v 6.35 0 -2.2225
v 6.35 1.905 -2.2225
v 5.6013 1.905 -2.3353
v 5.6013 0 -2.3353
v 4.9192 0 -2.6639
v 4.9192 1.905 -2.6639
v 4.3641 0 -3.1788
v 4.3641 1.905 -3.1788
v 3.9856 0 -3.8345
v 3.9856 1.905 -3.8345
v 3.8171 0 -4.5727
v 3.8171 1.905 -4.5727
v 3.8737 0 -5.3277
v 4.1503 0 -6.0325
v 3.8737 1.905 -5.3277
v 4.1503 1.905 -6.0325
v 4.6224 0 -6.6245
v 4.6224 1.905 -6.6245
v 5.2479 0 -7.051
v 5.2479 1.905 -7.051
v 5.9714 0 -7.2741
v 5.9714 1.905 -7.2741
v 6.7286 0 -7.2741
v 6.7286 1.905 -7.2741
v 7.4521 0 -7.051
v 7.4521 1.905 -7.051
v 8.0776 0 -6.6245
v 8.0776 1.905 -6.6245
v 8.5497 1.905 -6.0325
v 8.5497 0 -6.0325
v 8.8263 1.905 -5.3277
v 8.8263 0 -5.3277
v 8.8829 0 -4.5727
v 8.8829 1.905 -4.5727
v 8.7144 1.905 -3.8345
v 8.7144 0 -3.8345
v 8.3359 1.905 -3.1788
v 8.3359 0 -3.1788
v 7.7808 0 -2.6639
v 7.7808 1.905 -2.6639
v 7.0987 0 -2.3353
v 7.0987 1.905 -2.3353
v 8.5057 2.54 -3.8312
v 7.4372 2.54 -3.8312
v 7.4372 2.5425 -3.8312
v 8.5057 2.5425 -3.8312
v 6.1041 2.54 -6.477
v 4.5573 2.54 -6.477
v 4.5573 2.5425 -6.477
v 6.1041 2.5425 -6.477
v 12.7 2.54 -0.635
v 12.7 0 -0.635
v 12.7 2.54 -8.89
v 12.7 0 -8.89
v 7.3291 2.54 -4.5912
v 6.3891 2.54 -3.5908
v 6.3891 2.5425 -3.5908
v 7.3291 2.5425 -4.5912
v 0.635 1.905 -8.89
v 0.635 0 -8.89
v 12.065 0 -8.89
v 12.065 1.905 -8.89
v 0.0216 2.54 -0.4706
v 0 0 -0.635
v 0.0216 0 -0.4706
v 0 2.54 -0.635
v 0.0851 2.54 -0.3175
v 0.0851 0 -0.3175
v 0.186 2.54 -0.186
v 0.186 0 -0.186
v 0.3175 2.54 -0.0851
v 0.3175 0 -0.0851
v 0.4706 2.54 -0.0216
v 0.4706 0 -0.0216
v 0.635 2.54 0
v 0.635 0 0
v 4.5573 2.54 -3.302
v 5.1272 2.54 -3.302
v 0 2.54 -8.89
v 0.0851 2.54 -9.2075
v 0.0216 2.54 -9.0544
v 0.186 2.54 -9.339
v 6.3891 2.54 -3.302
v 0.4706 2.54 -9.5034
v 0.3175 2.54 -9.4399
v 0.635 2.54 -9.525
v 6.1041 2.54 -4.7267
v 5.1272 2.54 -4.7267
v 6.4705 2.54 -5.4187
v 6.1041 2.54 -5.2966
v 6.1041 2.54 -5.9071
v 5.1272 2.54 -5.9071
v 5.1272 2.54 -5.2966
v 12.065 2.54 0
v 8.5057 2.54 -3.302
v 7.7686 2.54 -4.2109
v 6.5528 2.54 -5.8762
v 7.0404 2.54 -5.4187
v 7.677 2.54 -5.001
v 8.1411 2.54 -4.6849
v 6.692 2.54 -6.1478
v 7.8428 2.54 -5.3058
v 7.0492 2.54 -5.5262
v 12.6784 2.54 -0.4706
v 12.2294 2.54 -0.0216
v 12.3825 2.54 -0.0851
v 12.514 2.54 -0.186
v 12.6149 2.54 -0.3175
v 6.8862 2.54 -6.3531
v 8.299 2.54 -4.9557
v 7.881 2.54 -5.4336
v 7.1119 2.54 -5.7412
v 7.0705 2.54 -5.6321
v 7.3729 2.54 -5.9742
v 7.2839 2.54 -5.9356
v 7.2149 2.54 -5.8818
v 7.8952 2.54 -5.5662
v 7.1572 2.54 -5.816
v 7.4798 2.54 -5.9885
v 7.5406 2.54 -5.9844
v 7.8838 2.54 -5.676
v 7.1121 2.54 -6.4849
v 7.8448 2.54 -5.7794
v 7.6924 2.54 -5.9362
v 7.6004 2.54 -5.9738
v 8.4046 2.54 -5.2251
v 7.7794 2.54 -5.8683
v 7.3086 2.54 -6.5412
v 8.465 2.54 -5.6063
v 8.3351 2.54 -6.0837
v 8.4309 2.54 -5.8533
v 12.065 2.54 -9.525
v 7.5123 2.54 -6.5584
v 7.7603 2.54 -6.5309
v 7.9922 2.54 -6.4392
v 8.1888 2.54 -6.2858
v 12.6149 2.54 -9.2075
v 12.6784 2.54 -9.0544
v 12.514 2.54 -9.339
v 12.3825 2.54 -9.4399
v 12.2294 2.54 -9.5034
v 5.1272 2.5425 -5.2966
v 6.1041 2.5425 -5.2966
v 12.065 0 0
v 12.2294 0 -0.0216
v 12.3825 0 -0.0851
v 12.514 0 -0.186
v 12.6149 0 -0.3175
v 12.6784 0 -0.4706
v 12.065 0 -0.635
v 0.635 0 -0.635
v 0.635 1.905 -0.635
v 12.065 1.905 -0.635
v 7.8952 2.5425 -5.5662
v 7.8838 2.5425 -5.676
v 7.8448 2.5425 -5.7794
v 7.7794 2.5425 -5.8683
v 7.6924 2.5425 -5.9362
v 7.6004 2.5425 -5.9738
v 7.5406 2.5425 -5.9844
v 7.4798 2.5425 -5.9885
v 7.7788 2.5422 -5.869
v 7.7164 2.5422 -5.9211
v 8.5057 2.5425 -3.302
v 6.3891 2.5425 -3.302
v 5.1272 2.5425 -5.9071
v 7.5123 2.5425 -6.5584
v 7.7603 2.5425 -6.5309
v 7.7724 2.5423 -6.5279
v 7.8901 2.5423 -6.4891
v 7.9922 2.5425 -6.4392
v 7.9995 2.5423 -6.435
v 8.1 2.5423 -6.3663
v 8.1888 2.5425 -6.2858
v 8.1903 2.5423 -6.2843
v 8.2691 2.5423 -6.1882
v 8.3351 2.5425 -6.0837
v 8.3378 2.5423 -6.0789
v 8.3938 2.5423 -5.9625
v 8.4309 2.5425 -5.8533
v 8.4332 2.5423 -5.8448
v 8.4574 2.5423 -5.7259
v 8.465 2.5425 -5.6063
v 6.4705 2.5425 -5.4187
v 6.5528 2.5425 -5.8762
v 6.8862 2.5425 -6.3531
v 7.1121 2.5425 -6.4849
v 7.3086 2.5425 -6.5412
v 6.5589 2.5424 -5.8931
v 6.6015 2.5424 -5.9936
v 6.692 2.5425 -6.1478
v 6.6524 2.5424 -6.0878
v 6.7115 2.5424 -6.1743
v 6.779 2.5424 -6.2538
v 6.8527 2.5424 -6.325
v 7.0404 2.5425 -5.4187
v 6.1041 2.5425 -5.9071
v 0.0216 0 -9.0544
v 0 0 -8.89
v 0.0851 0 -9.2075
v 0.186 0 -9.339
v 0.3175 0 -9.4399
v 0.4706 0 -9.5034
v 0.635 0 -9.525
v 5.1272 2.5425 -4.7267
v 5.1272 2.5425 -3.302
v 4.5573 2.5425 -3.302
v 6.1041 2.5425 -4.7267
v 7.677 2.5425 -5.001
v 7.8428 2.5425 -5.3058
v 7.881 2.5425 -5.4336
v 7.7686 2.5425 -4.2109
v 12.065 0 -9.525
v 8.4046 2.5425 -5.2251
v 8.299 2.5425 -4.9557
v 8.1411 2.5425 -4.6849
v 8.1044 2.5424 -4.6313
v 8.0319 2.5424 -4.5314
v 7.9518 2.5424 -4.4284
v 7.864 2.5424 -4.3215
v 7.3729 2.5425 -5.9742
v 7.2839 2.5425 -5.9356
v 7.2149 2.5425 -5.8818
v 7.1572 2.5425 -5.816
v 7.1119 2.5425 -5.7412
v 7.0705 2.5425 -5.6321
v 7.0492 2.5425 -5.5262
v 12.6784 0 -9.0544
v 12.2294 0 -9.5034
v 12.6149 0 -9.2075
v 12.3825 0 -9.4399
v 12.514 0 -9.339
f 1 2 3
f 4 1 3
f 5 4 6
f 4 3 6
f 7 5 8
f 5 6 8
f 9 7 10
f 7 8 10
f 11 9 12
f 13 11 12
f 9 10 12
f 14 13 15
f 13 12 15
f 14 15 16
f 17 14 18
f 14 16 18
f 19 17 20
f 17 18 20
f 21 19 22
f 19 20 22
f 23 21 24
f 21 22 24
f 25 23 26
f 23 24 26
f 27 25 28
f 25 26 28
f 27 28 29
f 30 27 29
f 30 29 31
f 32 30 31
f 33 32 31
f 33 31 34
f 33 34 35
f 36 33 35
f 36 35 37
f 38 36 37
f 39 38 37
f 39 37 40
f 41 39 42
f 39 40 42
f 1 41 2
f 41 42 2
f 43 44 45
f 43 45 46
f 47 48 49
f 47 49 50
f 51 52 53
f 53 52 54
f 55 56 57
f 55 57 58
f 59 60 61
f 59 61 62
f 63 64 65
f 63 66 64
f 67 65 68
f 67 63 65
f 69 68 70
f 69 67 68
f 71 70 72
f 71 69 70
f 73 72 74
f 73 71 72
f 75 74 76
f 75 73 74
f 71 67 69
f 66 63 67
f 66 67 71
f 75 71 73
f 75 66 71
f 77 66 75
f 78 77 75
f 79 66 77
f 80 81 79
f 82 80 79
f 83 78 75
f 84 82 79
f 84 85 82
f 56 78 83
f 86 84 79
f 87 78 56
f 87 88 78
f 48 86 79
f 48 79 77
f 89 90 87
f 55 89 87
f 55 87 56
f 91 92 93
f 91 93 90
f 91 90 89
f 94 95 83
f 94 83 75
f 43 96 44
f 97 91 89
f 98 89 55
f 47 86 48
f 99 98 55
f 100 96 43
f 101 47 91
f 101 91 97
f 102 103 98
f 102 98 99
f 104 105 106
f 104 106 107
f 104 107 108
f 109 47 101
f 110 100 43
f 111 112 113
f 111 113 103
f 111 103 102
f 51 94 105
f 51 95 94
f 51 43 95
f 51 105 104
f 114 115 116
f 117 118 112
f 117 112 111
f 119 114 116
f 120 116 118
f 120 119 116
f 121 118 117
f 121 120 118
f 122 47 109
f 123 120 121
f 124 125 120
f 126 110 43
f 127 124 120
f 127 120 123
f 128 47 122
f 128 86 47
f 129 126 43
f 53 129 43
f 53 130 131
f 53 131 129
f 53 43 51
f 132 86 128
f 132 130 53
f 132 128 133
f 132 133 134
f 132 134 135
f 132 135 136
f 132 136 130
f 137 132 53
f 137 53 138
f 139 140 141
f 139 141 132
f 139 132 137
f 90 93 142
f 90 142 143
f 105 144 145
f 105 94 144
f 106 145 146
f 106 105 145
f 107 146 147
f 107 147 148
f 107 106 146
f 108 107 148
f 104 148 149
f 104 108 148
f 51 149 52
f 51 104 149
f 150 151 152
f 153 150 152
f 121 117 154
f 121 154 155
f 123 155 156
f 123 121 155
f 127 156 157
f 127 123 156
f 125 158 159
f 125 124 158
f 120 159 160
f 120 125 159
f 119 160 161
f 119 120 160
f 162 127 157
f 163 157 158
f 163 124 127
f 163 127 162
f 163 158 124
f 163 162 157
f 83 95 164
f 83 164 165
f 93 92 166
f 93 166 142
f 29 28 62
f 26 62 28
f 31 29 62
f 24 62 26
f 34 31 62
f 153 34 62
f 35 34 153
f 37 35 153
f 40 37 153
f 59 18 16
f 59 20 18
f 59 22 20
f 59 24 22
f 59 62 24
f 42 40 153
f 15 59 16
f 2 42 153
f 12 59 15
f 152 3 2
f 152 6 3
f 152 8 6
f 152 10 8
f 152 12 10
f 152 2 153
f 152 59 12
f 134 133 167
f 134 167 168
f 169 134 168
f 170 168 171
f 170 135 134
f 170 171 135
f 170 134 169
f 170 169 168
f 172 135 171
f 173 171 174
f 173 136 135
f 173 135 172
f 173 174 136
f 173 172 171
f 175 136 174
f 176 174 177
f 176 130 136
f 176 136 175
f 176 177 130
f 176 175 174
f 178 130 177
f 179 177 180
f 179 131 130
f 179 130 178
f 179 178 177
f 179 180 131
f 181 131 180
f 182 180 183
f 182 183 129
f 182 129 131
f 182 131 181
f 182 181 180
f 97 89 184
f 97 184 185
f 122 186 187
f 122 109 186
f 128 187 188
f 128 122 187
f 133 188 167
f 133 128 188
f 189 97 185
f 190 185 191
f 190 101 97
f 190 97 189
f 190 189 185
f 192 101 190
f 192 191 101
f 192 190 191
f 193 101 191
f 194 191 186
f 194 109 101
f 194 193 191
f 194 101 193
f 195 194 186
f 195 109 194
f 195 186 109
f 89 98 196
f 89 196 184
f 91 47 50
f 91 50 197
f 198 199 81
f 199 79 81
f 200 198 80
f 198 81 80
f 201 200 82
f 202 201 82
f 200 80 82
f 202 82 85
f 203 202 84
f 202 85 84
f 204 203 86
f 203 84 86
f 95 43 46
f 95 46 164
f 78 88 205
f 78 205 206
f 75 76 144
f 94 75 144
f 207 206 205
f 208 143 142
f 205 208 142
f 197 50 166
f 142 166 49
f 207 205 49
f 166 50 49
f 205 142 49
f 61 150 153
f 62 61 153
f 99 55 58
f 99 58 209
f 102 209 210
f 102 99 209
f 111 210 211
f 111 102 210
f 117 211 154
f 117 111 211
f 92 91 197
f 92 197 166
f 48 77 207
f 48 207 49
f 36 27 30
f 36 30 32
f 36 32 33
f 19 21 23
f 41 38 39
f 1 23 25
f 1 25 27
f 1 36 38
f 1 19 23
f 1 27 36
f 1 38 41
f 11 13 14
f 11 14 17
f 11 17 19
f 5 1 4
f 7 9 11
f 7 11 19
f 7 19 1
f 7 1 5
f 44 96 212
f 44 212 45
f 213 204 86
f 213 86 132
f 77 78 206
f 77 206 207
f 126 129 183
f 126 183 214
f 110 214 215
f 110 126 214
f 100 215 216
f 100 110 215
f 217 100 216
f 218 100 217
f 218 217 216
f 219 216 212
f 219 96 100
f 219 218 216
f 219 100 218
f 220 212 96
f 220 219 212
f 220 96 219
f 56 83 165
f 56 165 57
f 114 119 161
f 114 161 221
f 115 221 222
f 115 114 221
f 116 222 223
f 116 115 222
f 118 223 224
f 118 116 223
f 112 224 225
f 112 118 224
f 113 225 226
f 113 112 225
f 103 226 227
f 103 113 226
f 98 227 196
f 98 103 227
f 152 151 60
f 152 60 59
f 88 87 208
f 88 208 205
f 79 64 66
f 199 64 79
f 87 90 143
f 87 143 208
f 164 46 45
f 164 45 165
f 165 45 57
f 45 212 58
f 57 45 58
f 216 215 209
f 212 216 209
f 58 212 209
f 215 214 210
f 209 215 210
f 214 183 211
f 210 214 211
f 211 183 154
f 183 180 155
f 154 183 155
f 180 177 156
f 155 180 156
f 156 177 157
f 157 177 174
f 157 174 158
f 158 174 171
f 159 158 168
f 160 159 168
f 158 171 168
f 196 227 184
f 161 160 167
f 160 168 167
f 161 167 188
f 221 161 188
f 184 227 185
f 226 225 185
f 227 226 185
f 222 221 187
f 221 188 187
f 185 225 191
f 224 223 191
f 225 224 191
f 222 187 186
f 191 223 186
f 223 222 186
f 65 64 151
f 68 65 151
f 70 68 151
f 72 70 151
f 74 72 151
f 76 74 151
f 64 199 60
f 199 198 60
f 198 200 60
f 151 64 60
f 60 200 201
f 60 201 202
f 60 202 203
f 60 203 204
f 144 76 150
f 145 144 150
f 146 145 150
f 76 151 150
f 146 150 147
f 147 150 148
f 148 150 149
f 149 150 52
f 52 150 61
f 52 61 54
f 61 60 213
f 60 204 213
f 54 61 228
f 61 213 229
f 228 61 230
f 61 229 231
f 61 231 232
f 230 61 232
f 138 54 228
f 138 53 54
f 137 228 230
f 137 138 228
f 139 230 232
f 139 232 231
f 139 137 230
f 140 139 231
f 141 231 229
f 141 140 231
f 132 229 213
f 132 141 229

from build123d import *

# Parameters (mm, degrees)
SKETCH1_W           = 12.7
SKETCH1_H           = 9.525
BOSS_EXTRUDE1_DEPTH = 2.54
FILLET1_R           = 0.635
SHELL1_START        = 0.635
SHELL1_OUTLINE_W    = 1.905
SHELL1_OUTLINE_H    = 8.255
SHELL1_DEPTH        = 11.43
SKETCH2_R           = 2.54
BOSS_EXTRUDE2_DEPTH = 1.905
BOSS_EXTRUDE3_DEPTH = 0.00254


# Read off the part's stored shape, not the designer's step: Shell1
with BuildPart() as part:
    # Sketch1 → Boss-Extrude1 (new body)
    with BuildSketch(Plane(origin=(0, 0, 0), x_dir=(1, 0, 0), z_dir=(0, 1, 0))):
        with Locations((6.35, 4.7625)):
            Rectangle(SKETCH1_W, SKETCH1_H)
    extrude(amount=BOSS_EXTRUDE1_DEPTH)

    # Fillet1
    fillet1_edges = [part.edges().sort_by_distance(p)[0] for p in [
        (0, 1.27, -9.525),
        (12.7, 1.27, -9.525),
        (12.7, 1.27, 0),
        (0, 1.27, 0),
    ]]
    fillet(fillet1_edges, radius=FILLET1_R)

    # Shell1 outline → Shell1 (cut)
    with BuildSketch(Plane.YZ.offset(SHELL1_START)):
        with Locations((0.9525, -4.7625)):
            Rectangle(SHELL1_OUTLINE_W, SHELL1_OUTLINE_H)
    extrude(amount=SHELL1_DEPTH, mode=Mode.SUBTRACT)

    # Sketch2 → Boss-Extrude2 (add)
    with BuildSketch(Plane(origin=(0, 1.905, 0), x_dir=(-1, 0, 0), z_dir=(0, -1, 0))):
        with Locations(Location((-6.35, 4.7625, 0), (0, 0, 270))):
            Circle(SKETCH2_R)
    extrude(amount=BOSS_EXTRUDE2_DEPTH)

    # Sketch3 → Boss-Extrude3 (add)
    with BuildSketch(Plane(origin=(0, 2.54, 0), x_dir=(1, 0, 0), z_dir=(0, 1, 0))):
        Polygon((4.557346154, 6.477), (6.104141026, 6.477), (6.104141026, 5.907128205), (5.127217949, 5.907128205), (5.127217949, 5.296551282), (6.104141026, 5.296551282), (6.104141026, 4.726679487), (5.127217949, 4.726679487), (5.127217949, 3.302), (4.557346154, 3.302), align=None)
        with BuildLine():
            Line((7.040358974, 5.418666667), (6.470487179, 5.418666667))
            add(Edge.make_bspline(
                [(6.470487179, 5.418666667), (6.472948368, 5.461774453), (6.477757384, 5.54600448), (6.496886431, 5.66835129), (6.522518698, 5.783955572), (6.556728361, 5.89241293), (6.599715041, 5.993683952), (6.65037258, 6.088113879), (6.709995163, 6.175205533), (6.777313826, 6.254538911), (6.851185682, 6.325709616), (6.930077079, 6.388814034), (7.015194768, 6.440886212), (7.104983579, 6.483736794), (7.199428222, 6.517972417), (7.299422293, 6.540861702), (7.404099988, 6.55636255), (7.475760347, 6.557718936), (7.512284054, 6.558410256)],
                knots=[0, 0, 0, 0, 1.199038563, 2.342849363, 3.436047546, 4.486744587, 5.497670872, 6.488682221, 7.459191391, 8.424610317, 9.374430501, 10.305433194, 11.225809216, 12.140057399, 13.06607119, 14.010487599, 14.985989317, 16, 16, 16, 16], degree=3))
            add(Edge.make_bspline(
                [(7.512284054, 6.558410256), (7.557116388, 6.557011369), (7.644639608, 6.554280414), (7.77181779, 6.53098446), (7.890588306, 6.492018376), (8.000864822, 6.437572481), (8.101708535, 6.368404679), (8.193102721, 6.285933395), (8.272283476, 6.188428338), (8.339752827, 6.079946535), (8.395811794, 5.965079574), (8.435095583, 5.846302372), (8.460916395, 5.726766795), (8.463670345, 5.646277588), (8.465038462, 5.606291867)],
                knots=[0, 0, 0, 0, 1.075374347, 2.099382735, 3.09057751, 4.06680945, 5.040638231, 6.016817125, 7.011024321, 8.044445721, 9.0776792, 10.070479129, 11.0414456, 12, 12, 12, 12], degree=3))
            add(Edge.make_bspline(
                [(8.465038462, 5.606291867), (8.464505789, 5.582105677), (8.463433651, 5.53342485), (8.455978932, 5.459758812), (8.44479538, 5.384721339), (8.427933309, 5.308376769), (8.406904924, 5.230703702), (8.381394454, 5.151469689), (8.350810158, 5.071123958), (8.315662426, 4.98876223), (8.273731092, 4.904117111), (8.224907883, 4.815919737), (8.167896919, 4.724248345), (8.103386822, 4.62858533), (8.03106428, 4.529081566), (7.950576239, 4.426036789), (7.862849733, 4.319087904), (7.800587764, 4.247598577), (7.768599159, 4.210869191)],
                knots=[0, 0, 0, 0, 0.728284026, 1.46585585, 2.227944881, 3.01186502, 3.81876927, 4.650621989, 5.517437689, 6.406905708, 7.346299482, 8.360816762, 9.441613733, 10.596154504, 11.834900912, 13.145207542, 14.533280747, 16, 16, 16, 16], degree=3))
            Line((7.768599159, 4.210869191), (7.437233974, 3.831166667))
            Line((7.437233974, 3.831166667), (8.50574359, 3.831166667))
            Line((8.50574359, 3.831166667), (8.50574359, 3.302))
            Line((8.50574359, 3.302), (6.389076923, 3.302))
            Line((6.389076923, 3.302), (6.389076923, 3.590752003))
            Line((6.389076923, 3.590752003), (7.329110978, 4.591207732))
            add(Edge.make_bspline(
                [(7.329110978, 4.591207732), (7.356327379, 4.620391337), (7.409037478, 4.676911324), (7.484038516, 4.759916937), (7.551907831, 4.838687284), (7.611238096, 4.914061108), (7.665142888, 4.983593589), (7.711218596, 5.049380524), (7.749886777, 5.110827174), (7.791866571, 5.184921103), (7.831733577, 5.273291298), (7.868313967, 5.375097387), (7.890612246, 5.47240056), (7.893690114, 5.5358054), (7.895166667, 5.566222756)],
                knots=[0, 0, 0, 0, 1.246127091, 2.413378631, 3.493388633, 4.492180848, 5.408488754, 6.240484944, 6.999099869, 7.674939598, 8.898438119, 10.020720584, 11.050475521, 12, 12, 12, 12], degree=3))
            add(Edge.make_bspline(
                [(7.895166667, 5.566222756), (7.894062684, 5.595649202), (7.89192354, 5.652667658), (7.868416082, 5.733776109), (7.831997512, 5.807211531), (7.780678605, 5.870779591), (7.718515335, 5.923017682), (7.646679837, 5.961870906), (7.565757782, 5.984289038), (7.50902988, 5.987094988), (7.479847155, 5.988538462)],
                knots=[0, 0, 0, 0, 1.062038974, 2.057870785, 3.028805853, 4.01125022, 4.991535629, 5.949134679, 6.94496649, 8, 8, 8, 8], degree=3))
            add(Edge.make_bspline(
                [(7.479847155, 5.988538462), (7.464770988, 5.988005225), (7.435091132, 5.986955463), (7.391464063, 5.979967483), (7.349949772, 5.967651898), (7.310086183, 5.951150747), (7.27229873, 5.929278353), (7.236682725, 5.902317143), (7.202862908, 5.870952262), (7.170994391, 5.835281784), (7.14198988, 5.79547352), (7.116228179, 5.751891037), (7.094927542, 5.704561389), (7.076173686, 5.654109398), (7.061709815, 5.59999317), (7.051178323, 5.542536583), (7.043171933, 5.481833113), (7.041313685, 5.440105185), (7.040358974, 5.418666667)],
                knots=[0, 0, 0, 0, 0.903469896, 1.778625579, 2.63899355, 3.493148037, 4.358286772, 5.247621495, 6.164656832, 7.118446693, 8.109501108, 9.111810964, 10.146451449, 11.215617525, 12.33435995, 13.498009769, 14.714554818, 16, 16, 16, 16], degree=3))
        make_face()
    extrude(amount=BOSS_EXTRUDE3_DEPTH)


solid = part.part
